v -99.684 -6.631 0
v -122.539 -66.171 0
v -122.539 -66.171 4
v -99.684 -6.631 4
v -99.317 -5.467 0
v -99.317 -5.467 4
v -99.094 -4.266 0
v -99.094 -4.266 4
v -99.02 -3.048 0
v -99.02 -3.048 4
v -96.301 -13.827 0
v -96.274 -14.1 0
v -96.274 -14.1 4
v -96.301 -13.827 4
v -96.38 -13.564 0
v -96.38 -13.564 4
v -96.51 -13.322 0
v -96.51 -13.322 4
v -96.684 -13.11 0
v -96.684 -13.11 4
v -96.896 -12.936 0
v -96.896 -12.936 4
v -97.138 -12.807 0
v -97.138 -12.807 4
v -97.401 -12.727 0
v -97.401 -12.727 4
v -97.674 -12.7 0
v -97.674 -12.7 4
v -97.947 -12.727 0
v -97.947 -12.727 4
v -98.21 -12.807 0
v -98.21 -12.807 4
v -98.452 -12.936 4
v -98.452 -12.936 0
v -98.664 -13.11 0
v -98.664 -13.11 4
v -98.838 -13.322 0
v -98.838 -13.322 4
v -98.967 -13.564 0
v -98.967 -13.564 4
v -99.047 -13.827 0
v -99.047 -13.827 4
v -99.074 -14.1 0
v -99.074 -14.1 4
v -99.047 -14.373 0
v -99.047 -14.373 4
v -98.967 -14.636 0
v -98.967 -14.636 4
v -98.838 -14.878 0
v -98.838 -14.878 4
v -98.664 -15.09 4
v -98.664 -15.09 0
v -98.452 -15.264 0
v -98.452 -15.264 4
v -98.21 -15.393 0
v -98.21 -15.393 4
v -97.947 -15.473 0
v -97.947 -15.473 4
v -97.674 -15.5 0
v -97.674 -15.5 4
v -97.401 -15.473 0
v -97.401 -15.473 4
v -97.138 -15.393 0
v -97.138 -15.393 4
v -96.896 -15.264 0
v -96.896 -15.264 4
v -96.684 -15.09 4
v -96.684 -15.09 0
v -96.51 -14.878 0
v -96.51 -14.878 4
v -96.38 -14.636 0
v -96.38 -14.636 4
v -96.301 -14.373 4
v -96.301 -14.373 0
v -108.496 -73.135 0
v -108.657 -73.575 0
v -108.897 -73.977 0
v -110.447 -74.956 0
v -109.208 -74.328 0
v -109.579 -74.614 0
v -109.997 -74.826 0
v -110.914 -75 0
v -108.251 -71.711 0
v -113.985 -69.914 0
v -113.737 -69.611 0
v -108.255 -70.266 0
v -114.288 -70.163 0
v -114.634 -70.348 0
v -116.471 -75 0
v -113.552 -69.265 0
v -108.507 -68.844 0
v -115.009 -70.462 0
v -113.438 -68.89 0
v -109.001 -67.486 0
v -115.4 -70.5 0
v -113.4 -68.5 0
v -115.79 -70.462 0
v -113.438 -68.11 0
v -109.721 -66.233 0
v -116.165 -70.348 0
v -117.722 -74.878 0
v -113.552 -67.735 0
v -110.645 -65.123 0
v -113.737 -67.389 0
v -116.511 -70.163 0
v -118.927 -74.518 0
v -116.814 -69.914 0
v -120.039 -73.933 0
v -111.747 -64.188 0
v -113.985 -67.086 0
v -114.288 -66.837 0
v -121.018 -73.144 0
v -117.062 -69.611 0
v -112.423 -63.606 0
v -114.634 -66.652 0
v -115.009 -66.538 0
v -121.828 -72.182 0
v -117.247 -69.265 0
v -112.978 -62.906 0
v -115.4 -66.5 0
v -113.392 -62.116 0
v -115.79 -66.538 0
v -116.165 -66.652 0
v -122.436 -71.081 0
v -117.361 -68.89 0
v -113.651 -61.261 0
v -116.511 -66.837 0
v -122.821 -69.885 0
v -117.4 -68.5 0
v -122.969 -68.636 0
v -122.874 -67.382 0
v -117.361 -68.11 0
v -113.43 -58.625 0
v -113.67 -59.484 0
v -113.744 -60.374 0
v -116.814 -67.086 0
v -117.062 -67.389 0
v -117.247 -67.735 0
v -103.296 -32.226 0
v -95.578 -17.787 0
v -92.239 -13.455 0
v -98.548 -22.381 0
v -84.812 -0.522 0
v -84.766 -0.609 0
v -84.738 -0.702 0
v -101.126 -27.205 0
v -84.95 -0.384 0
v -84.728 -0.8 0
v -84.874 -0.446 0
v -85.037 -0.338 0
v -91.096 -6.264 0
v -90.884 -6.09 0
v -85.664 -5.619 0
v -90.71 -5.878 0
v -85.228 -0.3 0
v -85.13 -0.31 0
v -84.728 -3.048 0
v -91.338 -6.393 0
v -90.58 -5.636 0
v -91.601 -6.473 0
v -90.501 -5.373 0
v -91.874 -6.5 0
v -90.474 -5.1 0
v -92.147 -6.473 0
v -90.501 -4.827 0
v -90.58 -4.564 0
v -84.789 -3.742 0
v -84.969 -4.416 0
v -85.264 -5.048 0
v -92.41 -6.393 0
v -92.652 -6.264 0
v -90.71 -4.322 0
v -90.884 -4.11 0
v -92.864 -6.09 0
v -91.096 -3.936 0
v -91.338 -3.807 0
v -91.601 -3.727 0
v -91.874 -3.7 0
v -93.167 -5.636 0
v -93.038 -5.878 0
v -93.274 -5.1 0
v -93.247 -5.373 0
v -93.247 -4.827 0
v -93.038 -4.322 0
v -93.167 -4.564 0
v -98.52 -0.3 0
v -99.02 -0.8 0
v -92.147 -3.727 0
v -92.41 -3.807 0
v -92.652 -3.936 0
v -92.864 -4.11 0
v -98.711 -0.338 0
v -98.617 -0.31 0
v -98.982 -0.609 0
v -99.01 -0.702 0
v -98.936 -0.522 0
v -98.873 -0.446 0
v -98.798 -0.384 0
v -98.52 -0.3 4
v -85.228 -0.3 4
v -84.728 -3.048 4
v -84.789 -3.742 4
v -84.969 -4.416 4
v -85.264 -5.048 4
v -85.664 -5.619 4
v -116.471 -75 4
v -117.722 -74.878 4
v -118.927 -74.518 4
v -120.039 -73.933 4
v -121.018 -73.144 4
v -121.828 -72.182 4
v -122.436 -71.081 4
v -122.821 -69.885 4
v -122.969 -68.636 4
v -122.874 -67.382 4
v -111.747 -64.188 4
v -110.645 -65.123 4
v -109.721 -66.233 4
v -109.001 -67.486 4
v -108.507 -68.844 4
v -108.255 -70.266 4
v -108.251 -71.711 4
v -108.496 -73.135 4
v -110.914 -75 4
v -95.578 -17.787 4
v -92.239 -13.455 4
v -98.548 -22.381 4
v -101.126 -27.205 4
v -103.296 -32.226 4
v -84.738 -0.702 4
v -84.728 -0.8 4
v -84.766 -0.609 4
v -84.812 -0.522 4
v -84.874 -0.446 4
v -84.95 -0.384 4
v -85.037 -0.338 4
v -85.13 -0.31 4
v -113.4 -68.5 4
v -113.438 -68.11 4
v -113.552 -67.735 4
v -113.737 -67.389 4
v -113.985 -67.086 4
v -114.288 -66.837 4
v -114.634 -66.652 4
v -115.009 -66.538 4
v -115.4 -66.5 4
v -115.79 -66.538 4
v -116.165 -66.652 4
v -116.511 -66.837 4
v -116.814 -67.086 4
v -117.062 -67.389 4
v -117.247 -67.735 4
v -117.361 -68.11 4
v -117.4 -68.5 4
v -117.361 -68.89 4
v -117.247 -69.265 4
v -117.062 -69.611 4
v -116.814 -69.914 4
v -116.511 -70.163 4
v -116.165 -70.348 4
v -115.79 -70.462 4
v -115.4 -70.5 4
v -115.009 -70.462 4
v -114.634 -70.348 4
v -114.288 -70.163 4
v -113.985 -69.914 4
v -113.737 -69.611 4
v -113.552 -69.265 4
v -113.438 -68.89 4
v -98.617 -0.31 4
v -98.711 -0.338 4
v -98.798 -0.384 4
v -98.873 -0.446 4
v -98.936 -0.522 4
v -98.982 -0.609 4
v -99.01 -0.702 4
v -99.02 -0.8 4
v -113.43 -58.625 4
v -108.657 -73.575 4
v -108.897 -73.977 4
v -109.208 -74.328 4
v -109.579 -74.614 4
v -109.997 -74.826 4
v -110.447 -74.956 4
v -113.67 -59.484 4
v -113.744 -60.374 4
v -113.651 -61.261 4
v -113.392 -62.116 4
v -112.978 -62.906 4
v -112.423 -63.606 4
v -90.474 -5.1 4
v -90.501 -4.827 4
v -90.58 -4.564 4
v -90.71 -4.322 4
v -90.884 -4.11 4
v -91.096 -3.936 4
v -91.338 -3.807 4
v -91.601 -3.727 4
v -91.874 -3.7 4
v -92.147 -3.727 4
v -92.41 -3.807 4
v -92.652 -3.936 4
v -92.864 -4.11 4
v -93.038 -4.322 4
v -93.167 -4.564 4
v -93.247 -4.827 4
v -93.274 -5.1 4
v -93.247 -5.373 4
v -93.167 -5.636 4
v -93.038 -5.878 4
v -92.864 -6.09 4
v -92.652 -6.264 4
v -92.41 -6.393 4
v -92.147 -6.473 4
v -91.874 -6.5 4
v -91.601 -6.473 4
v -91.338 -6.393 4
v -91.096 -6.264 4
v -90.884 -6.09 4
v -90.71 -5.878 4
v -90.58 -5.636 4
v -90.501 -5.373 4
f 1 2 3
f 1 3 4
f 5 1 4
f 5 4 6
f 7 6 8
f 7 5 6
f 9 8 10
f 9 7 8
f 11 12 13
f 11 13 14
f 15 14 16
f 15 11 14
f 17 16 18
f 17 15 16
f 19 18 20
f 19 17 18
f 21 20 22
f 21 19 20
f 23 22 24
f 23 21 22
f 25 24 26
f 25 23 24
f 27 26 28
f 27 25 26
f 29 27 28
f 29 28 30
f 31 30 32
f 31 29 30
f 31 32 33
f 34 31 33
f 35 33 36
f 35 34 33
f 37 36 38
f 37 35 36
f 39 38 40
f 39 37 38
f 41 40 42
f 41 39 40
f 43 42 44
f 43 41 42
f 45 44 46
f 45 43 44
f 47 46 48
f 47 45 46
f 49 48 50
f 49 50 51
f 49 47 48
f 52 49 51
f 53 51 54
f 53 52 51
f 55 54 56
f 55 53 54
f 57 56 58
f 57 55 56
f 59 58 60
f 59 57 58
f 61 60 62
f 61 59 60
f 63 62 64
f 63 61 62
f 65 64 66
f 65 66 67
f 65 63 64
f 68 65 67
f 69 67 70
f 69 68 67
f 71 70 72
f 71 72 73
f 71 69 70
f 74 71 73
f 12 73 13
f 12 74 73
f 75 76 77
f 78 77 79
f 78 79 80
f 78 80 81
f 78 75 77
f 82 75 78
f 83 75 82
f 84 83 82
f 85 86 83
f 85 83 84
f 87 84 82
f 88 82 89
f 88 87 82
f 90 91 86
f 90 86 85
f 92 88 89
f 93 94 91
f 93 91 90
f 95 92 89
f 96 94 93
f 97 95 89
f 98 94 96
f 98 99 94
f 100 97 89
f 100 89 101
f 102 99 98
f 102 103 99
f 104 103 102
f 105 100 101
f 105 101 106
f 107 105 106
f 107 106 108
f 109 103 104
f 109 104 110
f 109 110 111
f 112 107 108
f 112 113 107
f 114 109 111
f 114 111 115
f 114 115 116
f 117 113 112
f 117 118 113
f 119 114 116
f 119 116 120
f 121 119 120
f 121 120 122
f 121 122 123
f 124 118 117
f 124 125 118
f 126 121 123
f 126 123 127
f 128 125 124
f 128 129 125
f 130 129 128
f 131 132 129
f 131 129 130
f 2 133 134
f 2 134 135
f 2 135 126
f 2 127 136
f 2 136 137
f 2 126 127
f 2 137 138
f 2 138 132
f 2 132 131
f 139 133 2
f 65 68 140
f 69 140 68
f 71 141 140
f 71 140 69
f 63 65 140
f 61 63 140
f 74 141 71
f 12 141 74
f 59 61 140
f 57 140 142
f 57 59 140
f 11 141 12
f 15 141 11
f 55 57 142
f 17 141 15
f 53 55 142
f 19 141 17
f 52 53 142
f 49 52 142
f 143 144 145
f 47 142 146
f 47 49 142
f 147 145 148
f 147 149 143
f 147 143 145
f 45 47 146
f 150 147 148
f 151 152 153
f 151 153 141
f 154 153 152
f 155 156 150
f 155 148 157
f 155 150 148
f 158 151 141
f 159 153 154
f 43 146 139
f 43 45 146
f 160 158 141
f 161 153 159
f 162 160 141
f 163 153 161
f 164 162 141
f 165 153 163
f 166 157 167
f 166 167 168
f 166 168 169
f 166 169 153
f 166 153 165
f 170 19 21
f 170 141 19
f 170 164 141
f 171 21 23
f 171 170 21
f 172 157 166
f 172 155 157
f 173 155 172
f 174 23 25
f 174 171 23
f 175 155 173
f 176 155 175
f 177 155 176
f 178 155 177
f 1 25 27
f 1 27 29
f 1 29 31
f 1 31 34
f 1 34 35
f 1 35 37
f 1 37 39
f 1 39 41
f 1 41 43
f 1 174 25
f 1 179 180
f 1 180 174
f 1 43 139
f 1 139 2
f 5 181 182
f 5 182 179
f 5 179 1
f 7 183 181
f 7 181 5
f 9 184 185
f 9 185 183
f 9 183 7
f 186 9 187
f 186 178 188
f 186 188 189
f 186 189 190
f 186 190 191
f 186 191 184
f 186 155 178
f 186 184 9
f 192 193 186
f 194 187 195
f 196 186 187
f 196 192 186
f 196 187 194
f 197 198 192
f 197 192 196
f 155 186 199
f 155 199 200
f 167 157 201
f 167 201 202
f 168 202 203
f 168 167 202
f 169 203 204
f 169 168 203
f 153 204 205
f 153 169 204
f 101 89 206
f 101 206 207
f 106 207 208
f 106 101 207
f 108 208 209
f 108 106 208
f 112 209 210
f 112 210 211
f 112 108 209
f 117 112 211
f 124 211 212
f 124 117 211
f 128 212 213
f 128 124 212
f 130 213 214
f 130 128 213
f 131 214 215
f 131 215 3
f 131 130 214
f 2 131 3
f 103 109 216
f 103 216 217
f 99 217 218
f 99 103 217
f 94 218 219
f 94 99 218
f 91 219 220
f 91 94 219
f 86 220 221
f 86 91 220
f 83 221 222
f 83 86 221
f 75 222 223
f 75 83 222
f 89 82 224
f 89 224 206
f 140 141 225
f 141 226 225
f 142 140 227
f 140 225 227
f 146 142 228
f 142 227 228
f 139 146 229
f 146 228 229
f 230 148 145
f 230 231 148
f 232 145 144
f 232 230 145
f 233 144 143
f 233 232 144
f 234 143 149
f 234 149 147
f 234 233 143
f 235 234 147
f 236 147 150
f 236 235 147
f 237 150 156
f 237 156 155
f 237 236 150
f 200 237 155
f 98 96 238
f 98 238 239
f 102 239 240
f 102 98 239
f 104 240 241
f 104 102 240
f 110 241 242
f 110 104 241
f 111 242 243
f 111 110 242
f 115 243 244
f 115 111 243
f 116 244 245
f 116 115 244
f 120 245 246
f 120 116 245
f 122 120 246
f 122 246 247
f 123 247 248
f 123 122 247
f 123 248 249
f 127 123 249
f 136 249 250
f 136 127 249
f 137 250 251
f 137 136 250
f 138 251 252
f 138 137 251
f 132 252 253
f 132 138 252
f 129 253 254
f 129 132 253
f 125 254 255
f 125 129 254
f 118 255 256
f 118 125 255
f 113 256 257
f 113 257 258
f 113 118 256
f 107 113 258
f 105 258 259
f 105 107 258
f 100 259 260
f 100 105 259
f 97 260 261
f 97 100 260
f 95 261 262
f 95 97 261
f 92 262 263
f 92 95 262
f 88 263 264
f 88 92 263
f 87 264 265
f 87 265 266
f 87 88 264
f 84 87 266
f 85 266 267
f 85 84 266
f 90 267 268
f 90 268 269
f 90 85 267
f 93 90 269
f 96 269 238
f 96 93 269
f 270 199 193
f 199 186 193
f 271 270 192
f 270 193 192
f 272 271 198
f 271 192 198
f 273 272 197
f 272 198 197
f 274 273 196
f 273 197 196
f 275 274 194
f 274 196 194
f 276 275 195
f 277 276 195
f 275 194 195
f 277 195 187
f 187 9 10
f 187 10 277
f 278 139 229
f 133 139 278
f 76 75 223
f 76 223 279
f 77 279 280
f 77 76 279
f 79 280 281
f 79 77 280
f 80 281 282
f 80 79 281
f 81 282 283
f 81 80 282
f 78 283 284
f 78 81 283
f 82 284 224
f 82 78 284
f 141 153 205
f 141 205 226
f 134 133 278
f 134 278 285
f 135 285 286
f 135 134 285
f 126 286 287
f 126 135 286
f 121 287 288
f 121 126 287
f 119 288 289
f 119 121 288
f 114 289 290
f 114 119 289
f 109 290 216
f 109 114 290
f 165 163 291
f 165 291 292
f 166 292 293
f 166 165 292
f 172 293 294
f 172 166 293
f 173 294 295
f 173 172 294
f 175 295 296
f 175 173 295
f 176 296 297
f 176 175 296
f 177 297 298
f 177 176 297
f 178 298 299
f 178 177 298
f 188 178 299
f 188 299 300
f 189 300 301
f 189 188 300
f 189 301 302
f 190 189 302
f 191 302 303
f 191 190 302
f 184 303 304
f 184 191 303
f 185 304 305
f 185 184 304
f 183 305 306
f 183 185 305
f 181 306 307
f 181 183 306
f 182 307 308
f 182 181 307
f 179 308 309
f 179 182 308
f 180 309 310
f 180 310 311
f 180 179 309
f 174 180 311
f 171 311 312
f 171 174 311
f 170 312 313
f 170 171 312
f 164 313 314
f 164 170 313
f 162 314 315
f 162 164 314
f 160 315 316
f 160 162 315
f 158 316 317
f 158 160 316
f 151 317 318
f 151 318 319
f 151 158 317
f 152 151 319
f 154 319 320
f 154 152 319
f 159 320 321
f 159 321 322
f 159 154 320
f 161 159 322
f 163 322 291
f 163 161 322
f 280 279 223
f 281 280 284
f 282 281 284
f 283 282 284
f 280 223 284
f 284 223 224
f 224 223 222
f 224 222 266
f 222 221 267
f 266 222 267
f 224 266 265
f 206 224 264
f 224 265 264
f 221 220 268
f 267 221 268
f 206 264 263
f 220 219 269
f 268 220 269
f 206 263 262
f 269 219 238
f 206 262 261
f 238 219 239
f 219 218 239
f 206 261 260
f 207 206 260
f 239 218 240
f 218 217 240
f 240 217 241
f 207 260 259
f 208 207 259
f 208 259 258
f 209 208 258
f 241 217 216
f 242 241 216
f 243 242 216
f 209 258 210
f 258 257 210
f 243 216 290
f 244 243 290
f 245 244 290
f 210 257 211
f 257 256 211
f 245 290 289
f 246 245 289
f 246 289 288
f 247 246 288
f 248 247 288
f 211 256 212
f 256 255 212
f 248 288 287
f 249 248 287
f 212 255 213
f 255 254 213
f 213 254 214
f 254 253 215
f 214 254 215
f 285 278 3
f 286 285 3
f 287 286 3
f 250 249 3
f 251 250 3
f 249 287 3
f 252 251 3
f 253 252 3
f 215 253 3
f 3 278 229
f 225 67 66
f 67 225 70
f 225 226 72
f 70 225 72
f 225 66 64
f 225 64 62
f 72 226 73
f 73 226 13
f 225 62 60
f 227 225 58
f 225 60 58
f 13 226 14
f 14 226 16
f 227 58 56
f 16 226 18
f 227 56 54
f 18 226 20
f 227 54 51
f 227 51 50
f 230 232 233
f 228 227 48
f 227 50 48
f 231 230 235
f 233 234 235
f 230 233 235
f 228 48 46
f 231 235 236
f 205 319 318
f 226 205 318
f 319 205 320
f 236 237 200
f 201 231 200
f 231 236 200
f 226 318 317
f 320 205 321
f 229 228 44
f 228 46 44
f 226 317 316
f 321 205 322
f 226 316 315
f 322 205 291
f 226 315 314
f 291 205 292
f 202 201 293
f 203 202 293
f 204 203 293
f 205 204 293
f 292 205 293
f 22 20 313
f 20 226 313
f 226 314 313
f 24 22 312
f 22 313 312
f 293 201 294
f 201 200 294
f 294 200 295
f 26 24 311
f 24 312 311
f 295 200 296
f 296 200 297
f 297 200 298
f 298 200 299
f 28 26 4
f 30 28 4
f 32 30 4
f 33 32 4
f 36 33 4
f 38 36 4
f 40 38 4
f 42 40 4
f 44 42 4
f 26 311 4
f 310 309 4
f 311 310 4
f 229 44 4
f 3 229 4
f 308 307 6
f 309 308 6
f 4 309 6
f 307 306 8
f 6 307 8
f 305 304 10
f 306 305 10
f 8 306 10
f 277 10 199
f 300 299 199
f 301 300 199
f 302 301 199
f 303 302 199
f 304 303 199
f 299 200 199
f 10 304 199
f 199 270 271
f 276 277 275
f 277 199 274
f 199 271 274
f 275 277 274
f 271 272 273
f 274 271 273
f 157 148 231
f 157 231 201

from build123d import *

# Parameters (mm, degrees)
SKETCH_1_R               = 1.4
SKETCH_1_R_2             = 2
EXTRUDE_1_DEPTH          = 4
FILLET_1_R               = 66
CUT_EXTRUDE_1_DEPTH      = 145.092986744
CUT_EXTRUDE_1_DEPTH_BACK = 145.092986744
SKETCH_2_W               = 17.6
SKETCH_2_H               = 11.1
FILLET_3_R               = 0.5


with BuildPart() as part:
    # 草图1 → 凸台-拉伸1 (new body)
    with BuildSketch(Plane.XY):
        with BuildLine():
            Line((-97.873903688, 10.8), (-85.873903688, 10.8))
            ThreePointArc((-85.873903688, 10.8), (-83.8940047, 9.979898987), (-83.073903688, 8))
            ThreePointArc((-83.073903688, 8), (-83.1796222, 7.237866637), (-83.48879459, 6.53328442))
            Line((-83.48879459, 6.53328442), (-84.431683177, 5))
            ThreePointArc((-84.431683177, 5), (-84.652520599, 4.496726988), (-84.728033822, 3.952346014))
            Line((-84.728033822, 3.952346014), (-84.728033822, -3.047653986))
            ThreePointArc((-84.728033822, -3.047653986), (-84.969263339, -4.415734559), (-85.66385605, -5.618804425))
            Line((-85.66385605, -5.618804425), (-99.33833884, -21.915418417))
            Line((-99.33833884, -21.915418417), (-113.429667528, -58.624584688))
            ThreePointArc((-113.429667528, -58.624584688), (-113.541543089, -61.69465347), (-111.747141559, -64.18823756))
            ThreePointArc((-111.747141559, -64.18823756), (-108.724804348, -68.153933924), (-108.495917327, -73.134785316))
            ThreePointArc((-108.495917327, -73.134785316), (-109.387053216, -74.479515508), (-110.913984241, -75))
            Line((-110.913984241, -75), (-116.470682802, -75))
            ThreePointArc((-116.470682802, -75), (-121.827503028, -72.18164054), (-122.538955574, -66.170608328))
            Line((-122.538955574, -66.170608328), (-99.683969288, -6.631333481))
            ThreePointArc((-99.683969288, -6.631333481), (-99.187224477, -4.870009241), (-99.019773553, -3.047653986))
            Line((-99.019773553, -3.047653986), (-99.019773553, 3.952346014))
            ThreePointArc((-99.019773553, 3.952346014), (-99.095286776, 4.496726988), (-99.316124198, 5))
            Line((-99.316124198, 5), (-100.259012785, 6.53328442))
            ThreePointArc((-100.259012785, 6.53328442), (-100.568185176, 7.237866637), (-100.673903688, 8))
            ThreePointArc((-100.673903688, 8), (-99.853802675, 9.979898987), (-97.873903688, 10.8))
        make_face()
        with Locations((-85.873903688, 8)):
            Circle(SKETCH_1_R, mode=Mode.SUBTRACT)
        with Locations((-97.873903688, 8)):
            Circle(SKETCH_1_R, mode=Mode.SUBTRACT)
        with Locations((-97.673903688, -14.1)):
            Circle(SKETCH_1_R, mode=Mode.SUBTRACT)
        with Locations((-91.873903688, -5.1)):
            Circle(SKETCH_1_R, mode=Mode.SUBTRACT)
        with Locations((-115.399537808, -68.5)):
            Circle(SKETCH_1_R_2, mode=Mode.SUBTRACT)
        with BuildLine():
            Line((-88.763801636, 5.1), (-94.984005739, 5.1))
            ThreePointArc((-94.984005739, 5.1), (-95.172987976, 5.13708995), (-95.333932845, 5.242857143))
            ThreePointArc((-95.333932845, 5.242857143), (-95.615325044, 5.241421356), (-95.61676083, 4.960029158))
            ThreePointArc((-95.61676083, 4.960029158), (-95.510993638, 4.799084288), (-95.473903688, 4.610102051))
            Line((-95.473903688, 4.610102051), (-95.473903688, 0.389897949))
            ThreePointArc((-95.473903688, 0.389897949), (-95.510993638, 0.200915712), (-95.61676083, 0.039970842))
            ThreePointArc((-95.61676083, 0.039970842), (-95.615325044, -0.241421356), (-95.333932845, -0.242857143))
            ThreePointArc((-95.333932845, -0.242857143), (-95.172987976, -0.13708995), (-94.984005739, -0.1))
            Line((-94.984005739, -0.1), (-88.763801636, -0.1))
            ThreePointArc((-88.763801636, -0.1), (-88.5748194, -0.13708995), (-88.41387453, -0.242857143))
            ThreePointArc((-88.41387453, -0.242857143), (-88.132482331, -0.241421356), (-88.131046545, 0.039970842))
            ThreePointArc((-88.131046545, 0.039970842), (-88.236813737, 0.200915712), (-88.273903688, 0.389897949))
            Line((-88.273903688, 0.389897949), (-88.273903688, 4.610102051))
            ThreePointArc((-88.273903688, 4.610102051), (-88.236813737, 4.799084288), (-88.131046545, 4.960029158))
            ThreePointArc((-88.131046545, 4.960029158), (-88.132482331, 5.241421356), (-88.41387453, 5.242857143))
            ThreePointArc((-88.41387453, 5.242857143), (-88.5748194, 5.13708995), (-88.763801636, 5.1))
        make_face(mode=Mode.SUBTRACT)
    extrude(amount=EXTRUDE_1_DEPTH)

    # 圆角1
    fillet_1_edges = [part.edges().sort_by_distance(p)[0] for p in [
        (-99.33833884, -21.915418417, 2),
    ]]
    fillet(fillet_1_edges, radius=FILLET_1_R)

    # 草图2 → 切除-拉伸1 (cut, two sides: drawn at the far end of the back side and taken through both)
    with BuildSketch(Plane.XY.offset(4).offset(-CUT_EXTRUDE_1_DEPTH_BACK)):
        with Locations((-91.873903688, 5.25)):
            Rectangle(SKETCH_2_W, SKETCH_2_H)
    extrude(amount=CUT_EXTRUDE_1_DEPTH + CUT_EXTRUDE_1_DEPTH_BACK, mode=Mode.SUBTRACT)

    # 圆角3
    fillet_3_edges = [part.edges().sort_by_distance(p)[0] for p in [
        (-99.019773553, -0.3, 2),
        (-84.728033822, -0.3, 2),
    ]]
    fillet(fillet_3_edges, radius=FILLET_3_R)


solid = part.part
